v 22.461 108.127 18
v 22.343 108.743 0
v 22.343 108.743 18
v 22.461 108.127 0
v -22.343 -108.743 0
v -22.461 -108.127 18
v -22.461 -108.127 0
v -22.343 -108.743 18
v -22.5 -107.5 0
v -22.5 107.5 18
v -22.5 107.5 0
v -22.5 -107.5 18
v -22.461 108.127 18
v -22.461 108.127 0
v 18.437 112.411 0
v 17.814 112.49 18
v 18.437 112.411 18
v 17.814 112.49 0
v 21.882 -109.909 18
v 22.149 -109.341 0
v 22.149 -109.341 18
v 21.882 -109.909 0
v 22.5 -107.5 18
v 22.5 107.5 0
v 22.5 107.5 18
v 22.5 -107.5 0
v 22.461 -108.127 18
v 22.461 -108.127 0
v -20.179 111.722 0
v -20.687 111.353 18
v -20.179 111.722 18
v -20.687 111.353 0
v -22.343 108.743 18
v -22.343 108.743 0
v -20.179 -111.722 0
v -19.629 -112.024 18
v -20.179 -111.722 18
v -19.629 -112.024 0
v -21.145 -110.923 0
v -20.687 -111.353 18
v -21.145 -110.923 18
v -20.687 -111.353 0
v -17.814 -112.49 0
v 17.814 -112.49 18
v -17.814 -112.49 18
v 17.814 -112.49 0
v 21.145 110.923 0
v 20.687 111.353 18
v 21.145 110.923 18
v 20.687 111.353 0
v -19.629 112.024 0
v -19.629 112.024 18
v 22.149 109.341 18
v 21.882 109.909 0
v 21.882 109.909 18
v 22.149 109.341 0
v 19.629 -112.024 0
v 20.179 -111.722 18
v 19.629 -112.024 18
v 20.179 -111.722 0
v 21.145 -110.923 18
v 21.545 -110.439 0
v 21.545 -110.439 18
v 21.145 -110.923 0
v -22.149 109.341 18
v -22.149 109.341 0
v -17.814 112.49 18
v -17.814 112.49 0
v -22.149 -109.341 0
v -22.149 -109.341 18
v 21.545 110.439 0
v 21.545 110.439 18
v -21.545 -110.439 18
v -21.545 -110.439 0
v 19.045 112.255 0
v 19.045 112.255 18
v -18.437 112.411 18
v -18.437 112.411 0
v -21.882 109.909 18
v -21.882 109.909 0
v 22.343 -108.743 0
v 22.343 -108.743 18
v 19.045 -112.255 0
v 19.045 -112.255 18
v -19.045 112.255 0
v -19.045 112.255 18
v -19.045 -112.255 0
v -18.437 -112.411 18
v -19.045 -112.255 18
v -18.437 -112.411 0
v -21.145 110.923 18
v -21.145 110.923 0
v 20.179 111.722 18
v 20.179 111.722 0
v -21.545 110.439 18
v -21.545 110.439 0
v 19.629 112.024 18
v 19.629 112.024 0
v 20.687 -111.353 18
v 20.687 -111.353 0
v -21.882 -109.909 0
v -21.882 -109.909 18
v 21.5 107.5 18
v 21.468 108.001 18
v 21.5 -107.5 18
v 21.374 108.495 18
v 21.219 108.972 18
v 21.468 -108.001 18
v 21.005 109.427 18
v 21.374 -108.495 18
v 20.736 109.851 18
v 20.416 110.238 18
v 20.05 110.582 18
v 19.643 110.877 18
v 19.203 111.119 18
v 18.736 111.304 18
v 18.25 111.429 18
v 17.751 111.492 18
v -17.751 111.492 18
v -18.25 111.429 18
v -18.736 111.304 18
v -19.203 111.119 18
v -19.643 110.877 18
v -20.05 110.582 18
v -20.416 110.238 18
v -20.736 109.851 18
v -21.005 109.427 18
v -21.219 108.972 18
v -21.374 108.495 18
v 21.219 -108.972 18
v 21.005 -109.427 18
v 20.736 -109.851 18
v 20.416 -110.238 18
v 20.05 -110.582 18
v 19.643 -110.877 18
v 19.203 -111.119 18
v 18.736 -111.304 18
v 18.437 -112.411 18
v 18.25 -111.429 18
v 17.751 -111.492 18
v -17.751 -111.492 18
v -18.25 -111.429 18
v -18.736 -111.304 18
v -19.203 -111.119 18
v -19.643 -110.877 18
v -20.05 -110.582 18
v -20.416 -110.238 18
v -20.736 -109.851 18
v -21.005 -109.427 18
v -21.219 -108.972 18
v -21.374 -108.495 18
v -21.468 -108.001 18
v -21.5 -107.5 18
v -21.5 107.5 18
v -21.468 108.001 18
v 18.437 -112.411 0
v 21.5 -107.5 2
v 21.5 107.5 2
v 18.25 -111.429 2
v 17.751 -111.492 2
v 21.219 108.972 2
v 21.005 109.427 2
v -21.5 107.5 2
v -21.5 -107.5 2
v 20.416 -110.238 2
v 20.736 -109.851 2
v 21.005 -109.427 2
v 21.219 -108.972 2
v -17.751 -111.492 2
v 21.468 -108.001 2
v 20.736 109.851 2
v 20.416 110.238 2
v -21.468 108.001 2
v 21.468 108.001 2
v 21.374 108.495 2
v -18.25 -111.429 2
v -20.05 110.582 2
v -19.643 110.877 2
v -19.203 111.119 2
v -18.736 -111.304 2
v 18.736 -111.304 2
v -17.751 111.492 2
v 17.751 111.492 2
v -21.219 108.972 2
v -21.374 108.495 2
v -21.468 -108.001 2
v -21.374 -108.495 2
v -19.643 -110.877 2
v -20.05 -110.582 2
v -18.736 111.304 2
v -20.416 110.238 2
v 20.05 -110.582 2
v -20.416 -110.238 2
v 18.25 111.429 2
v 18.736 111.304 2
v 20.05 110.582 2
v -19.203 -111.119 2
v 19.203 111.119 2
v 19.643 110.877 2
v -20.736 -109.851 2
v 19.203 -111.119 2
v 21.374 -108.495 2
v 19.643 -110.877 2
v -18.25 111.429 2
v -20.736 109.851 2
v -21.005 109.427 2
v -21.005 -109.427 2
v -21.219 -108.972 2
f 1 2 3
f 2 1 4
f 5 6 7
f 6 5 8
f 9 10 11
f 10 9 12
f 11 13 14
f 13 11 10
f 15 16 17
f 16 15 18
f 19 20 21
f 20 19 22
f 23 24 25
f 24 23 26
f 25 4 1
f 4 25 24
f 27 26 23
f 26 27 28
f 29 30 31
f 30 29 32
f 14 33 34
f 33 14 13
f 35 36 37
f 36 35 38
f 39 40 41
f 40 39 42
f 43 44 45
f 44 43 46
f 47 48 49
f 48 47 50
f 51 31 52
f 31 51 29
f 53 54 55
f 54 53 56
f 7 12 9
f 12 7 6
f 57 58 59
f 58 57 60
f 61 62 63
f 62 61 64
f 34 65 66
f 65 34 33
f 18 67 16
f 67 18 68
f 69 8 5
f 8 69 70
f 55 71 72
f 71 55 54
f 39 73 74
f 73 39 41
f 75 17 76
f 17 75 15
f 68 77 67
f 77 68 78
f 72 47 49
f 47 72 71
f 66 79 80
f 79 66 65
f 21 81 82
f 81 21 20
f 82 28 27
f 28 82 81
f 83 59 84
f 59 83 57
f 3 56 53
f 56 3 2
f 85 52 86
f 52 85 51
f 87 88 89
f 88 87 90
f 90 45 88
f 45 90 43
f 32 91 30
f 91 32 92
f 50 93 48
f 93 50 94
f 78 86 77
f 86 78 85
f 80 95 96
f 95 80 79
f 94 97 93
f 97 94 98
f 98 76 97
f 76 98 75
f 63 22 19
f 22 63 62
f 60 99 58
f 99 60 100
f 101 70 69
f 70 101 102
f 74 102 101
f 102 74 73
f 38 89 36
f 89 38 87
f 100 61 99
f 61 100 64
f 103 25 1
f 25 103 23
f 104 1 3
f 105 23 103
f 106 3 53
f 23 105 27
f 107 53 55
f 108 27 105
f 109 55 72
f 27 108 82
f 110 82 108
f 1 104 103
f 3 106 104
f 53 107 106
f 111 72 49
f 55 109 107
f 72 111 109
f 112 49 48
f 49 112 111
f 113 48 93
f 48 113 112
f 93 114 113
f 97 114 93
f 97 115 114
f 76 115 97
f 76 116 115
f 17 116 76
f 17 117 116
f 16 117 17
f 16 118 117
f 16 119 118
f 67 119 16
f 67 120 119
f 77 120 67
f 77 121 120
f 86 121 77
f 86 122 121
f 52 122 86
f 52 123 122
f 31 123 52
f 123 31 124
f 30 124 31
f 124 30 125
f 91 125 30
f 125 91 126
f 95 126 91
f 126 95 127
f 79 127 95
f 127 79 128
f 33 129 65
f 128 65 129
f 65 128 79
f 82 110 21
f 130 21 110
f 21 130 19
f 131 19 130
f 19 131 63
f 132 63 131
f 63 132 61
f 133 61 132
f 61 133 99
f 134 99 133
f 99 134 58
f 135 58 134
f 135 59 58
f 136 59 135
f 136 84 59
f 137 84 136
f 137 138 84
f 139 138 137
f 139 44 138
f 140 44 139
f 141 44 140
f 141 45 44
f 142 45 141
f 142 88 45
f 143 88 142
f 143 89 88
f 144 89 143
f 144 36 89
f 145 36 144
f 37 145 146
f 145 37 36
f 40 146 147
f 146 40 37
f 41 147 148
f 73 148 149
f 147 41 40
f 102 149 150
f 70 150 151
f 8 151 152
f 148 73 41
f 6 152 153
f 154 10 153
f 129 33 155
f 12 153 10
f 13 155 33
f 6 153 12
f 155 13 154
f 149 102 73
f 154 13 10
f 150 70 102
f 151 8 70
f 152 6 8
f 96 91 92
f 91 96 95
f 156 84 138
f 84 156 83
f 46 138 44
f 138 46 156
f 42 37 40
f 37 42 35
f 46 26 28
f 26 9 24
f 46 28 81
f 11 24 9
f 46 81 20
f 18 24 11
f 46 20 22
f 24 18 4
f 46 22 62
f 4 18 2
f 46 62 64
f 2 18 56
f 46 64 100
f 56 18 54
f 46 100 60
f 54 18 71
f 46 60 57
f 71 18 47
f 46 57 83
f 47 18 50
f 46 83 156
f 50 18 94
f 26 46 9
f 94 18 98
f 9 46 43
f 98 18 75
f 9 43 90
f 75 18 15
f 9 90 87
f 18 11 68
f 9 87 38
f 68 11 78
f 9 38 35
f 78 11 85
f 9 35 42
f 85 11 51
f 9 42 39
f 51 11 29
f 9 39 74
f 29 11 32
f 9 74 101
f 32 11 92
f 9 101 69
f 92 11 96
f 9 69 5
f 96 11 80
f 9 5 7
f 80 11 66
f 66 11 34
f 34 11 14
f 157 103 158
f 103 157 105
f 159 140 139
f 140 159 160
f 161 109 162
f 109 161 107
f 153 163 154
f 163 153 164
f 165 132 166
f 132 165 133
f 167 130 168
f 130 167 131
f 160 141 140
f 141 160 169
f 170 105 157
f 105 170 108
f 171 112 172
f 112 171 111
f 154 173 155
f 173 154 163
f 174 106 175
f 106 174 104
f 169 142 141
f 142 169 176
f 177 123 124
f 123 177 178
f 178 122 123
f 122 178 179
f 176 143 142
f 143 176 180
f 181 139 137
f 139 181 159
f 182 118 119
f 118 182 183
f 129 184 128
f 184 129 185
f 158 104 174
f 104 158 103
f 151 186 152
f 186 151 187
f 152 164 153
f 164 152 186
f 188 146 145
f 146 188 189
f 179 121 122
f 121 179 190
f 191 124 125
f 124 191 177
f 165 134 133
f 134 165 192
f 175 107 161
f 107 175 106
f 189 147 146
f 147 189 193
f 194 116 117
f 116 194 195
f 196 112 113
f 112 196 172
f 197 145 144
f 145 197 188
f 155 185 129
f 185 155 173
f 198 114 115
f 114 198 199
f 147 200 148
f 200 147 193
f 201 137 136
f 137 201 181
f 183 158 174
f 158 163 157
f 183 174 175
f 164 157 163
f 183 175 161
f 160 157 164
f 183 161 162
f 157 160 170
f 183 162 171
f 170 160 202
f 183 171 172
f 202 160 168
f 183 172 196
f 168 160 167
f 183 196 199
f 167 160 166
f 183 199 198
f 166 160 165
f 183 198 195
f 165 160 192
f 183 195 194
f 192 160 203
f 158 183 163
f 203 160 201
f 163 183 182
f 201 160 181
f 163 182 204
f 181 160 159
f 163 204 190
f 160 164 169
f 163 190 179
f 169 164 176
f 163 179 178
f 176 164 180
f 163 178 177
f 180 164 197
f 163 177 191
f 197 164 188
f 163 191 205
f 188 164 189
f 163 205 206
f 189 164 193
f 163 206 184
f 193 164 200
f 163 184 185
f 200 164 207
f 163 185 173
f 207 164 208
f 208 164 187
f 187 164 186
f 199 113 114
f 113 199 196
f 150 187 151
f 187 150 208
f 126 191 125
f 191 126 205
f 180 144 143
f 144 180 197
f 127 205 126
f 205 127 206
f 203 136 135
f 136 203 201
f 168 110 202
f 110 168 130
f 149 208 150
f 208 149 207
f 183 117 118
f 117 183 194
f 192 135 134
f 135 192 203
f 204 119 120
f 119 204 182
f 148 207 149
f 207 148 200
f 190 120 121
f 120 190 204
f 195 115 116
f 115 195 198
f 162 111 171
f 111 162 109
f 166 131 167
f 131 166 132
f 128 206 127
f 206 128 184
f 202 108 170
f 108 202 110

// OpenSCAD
$fn = 50;


difference() {
	union() {
		hull() {
			translate(v = [-17.5000000000, 107.5000000000, 0]) {
				cylinder(h = 18, r = 5);
			}
			translate(v = [17.5000000000, 107.5000000000, 0]) {
				cylinder(h = 18, r = 5);
			}
			translate(v = [-17.5000000000, -107.5000000000, 0]) {
				cylinder(h = 18, r = 5);
			}
			translate(v = [17.5000000000, -107.5000000000, 0]) {
				cylinder(h = 18, r = 5);
			}
		}
	}
	union() {
		translate(v = [0, 0, 2]) {
			hull() {
				translate(v = [-17.5000000000, 107.5000000000, 0]) {
					cylinder(h = 16, r = 4);
				}
				translate(v = [17.5000000000, 107.5000000000, 0]) {
					cylinder(h = 16, r = 4);
				}
				translate(v = [-17.5000000000, -107.5000000000, 0]) {
					cylinder(h = 16, r = 4);
				}
				translate(v = [17.5000000000, -107.5000000000, 0]) {
					cylinder(h = 16, r = 4);
				}
			}
		}
	}
}
